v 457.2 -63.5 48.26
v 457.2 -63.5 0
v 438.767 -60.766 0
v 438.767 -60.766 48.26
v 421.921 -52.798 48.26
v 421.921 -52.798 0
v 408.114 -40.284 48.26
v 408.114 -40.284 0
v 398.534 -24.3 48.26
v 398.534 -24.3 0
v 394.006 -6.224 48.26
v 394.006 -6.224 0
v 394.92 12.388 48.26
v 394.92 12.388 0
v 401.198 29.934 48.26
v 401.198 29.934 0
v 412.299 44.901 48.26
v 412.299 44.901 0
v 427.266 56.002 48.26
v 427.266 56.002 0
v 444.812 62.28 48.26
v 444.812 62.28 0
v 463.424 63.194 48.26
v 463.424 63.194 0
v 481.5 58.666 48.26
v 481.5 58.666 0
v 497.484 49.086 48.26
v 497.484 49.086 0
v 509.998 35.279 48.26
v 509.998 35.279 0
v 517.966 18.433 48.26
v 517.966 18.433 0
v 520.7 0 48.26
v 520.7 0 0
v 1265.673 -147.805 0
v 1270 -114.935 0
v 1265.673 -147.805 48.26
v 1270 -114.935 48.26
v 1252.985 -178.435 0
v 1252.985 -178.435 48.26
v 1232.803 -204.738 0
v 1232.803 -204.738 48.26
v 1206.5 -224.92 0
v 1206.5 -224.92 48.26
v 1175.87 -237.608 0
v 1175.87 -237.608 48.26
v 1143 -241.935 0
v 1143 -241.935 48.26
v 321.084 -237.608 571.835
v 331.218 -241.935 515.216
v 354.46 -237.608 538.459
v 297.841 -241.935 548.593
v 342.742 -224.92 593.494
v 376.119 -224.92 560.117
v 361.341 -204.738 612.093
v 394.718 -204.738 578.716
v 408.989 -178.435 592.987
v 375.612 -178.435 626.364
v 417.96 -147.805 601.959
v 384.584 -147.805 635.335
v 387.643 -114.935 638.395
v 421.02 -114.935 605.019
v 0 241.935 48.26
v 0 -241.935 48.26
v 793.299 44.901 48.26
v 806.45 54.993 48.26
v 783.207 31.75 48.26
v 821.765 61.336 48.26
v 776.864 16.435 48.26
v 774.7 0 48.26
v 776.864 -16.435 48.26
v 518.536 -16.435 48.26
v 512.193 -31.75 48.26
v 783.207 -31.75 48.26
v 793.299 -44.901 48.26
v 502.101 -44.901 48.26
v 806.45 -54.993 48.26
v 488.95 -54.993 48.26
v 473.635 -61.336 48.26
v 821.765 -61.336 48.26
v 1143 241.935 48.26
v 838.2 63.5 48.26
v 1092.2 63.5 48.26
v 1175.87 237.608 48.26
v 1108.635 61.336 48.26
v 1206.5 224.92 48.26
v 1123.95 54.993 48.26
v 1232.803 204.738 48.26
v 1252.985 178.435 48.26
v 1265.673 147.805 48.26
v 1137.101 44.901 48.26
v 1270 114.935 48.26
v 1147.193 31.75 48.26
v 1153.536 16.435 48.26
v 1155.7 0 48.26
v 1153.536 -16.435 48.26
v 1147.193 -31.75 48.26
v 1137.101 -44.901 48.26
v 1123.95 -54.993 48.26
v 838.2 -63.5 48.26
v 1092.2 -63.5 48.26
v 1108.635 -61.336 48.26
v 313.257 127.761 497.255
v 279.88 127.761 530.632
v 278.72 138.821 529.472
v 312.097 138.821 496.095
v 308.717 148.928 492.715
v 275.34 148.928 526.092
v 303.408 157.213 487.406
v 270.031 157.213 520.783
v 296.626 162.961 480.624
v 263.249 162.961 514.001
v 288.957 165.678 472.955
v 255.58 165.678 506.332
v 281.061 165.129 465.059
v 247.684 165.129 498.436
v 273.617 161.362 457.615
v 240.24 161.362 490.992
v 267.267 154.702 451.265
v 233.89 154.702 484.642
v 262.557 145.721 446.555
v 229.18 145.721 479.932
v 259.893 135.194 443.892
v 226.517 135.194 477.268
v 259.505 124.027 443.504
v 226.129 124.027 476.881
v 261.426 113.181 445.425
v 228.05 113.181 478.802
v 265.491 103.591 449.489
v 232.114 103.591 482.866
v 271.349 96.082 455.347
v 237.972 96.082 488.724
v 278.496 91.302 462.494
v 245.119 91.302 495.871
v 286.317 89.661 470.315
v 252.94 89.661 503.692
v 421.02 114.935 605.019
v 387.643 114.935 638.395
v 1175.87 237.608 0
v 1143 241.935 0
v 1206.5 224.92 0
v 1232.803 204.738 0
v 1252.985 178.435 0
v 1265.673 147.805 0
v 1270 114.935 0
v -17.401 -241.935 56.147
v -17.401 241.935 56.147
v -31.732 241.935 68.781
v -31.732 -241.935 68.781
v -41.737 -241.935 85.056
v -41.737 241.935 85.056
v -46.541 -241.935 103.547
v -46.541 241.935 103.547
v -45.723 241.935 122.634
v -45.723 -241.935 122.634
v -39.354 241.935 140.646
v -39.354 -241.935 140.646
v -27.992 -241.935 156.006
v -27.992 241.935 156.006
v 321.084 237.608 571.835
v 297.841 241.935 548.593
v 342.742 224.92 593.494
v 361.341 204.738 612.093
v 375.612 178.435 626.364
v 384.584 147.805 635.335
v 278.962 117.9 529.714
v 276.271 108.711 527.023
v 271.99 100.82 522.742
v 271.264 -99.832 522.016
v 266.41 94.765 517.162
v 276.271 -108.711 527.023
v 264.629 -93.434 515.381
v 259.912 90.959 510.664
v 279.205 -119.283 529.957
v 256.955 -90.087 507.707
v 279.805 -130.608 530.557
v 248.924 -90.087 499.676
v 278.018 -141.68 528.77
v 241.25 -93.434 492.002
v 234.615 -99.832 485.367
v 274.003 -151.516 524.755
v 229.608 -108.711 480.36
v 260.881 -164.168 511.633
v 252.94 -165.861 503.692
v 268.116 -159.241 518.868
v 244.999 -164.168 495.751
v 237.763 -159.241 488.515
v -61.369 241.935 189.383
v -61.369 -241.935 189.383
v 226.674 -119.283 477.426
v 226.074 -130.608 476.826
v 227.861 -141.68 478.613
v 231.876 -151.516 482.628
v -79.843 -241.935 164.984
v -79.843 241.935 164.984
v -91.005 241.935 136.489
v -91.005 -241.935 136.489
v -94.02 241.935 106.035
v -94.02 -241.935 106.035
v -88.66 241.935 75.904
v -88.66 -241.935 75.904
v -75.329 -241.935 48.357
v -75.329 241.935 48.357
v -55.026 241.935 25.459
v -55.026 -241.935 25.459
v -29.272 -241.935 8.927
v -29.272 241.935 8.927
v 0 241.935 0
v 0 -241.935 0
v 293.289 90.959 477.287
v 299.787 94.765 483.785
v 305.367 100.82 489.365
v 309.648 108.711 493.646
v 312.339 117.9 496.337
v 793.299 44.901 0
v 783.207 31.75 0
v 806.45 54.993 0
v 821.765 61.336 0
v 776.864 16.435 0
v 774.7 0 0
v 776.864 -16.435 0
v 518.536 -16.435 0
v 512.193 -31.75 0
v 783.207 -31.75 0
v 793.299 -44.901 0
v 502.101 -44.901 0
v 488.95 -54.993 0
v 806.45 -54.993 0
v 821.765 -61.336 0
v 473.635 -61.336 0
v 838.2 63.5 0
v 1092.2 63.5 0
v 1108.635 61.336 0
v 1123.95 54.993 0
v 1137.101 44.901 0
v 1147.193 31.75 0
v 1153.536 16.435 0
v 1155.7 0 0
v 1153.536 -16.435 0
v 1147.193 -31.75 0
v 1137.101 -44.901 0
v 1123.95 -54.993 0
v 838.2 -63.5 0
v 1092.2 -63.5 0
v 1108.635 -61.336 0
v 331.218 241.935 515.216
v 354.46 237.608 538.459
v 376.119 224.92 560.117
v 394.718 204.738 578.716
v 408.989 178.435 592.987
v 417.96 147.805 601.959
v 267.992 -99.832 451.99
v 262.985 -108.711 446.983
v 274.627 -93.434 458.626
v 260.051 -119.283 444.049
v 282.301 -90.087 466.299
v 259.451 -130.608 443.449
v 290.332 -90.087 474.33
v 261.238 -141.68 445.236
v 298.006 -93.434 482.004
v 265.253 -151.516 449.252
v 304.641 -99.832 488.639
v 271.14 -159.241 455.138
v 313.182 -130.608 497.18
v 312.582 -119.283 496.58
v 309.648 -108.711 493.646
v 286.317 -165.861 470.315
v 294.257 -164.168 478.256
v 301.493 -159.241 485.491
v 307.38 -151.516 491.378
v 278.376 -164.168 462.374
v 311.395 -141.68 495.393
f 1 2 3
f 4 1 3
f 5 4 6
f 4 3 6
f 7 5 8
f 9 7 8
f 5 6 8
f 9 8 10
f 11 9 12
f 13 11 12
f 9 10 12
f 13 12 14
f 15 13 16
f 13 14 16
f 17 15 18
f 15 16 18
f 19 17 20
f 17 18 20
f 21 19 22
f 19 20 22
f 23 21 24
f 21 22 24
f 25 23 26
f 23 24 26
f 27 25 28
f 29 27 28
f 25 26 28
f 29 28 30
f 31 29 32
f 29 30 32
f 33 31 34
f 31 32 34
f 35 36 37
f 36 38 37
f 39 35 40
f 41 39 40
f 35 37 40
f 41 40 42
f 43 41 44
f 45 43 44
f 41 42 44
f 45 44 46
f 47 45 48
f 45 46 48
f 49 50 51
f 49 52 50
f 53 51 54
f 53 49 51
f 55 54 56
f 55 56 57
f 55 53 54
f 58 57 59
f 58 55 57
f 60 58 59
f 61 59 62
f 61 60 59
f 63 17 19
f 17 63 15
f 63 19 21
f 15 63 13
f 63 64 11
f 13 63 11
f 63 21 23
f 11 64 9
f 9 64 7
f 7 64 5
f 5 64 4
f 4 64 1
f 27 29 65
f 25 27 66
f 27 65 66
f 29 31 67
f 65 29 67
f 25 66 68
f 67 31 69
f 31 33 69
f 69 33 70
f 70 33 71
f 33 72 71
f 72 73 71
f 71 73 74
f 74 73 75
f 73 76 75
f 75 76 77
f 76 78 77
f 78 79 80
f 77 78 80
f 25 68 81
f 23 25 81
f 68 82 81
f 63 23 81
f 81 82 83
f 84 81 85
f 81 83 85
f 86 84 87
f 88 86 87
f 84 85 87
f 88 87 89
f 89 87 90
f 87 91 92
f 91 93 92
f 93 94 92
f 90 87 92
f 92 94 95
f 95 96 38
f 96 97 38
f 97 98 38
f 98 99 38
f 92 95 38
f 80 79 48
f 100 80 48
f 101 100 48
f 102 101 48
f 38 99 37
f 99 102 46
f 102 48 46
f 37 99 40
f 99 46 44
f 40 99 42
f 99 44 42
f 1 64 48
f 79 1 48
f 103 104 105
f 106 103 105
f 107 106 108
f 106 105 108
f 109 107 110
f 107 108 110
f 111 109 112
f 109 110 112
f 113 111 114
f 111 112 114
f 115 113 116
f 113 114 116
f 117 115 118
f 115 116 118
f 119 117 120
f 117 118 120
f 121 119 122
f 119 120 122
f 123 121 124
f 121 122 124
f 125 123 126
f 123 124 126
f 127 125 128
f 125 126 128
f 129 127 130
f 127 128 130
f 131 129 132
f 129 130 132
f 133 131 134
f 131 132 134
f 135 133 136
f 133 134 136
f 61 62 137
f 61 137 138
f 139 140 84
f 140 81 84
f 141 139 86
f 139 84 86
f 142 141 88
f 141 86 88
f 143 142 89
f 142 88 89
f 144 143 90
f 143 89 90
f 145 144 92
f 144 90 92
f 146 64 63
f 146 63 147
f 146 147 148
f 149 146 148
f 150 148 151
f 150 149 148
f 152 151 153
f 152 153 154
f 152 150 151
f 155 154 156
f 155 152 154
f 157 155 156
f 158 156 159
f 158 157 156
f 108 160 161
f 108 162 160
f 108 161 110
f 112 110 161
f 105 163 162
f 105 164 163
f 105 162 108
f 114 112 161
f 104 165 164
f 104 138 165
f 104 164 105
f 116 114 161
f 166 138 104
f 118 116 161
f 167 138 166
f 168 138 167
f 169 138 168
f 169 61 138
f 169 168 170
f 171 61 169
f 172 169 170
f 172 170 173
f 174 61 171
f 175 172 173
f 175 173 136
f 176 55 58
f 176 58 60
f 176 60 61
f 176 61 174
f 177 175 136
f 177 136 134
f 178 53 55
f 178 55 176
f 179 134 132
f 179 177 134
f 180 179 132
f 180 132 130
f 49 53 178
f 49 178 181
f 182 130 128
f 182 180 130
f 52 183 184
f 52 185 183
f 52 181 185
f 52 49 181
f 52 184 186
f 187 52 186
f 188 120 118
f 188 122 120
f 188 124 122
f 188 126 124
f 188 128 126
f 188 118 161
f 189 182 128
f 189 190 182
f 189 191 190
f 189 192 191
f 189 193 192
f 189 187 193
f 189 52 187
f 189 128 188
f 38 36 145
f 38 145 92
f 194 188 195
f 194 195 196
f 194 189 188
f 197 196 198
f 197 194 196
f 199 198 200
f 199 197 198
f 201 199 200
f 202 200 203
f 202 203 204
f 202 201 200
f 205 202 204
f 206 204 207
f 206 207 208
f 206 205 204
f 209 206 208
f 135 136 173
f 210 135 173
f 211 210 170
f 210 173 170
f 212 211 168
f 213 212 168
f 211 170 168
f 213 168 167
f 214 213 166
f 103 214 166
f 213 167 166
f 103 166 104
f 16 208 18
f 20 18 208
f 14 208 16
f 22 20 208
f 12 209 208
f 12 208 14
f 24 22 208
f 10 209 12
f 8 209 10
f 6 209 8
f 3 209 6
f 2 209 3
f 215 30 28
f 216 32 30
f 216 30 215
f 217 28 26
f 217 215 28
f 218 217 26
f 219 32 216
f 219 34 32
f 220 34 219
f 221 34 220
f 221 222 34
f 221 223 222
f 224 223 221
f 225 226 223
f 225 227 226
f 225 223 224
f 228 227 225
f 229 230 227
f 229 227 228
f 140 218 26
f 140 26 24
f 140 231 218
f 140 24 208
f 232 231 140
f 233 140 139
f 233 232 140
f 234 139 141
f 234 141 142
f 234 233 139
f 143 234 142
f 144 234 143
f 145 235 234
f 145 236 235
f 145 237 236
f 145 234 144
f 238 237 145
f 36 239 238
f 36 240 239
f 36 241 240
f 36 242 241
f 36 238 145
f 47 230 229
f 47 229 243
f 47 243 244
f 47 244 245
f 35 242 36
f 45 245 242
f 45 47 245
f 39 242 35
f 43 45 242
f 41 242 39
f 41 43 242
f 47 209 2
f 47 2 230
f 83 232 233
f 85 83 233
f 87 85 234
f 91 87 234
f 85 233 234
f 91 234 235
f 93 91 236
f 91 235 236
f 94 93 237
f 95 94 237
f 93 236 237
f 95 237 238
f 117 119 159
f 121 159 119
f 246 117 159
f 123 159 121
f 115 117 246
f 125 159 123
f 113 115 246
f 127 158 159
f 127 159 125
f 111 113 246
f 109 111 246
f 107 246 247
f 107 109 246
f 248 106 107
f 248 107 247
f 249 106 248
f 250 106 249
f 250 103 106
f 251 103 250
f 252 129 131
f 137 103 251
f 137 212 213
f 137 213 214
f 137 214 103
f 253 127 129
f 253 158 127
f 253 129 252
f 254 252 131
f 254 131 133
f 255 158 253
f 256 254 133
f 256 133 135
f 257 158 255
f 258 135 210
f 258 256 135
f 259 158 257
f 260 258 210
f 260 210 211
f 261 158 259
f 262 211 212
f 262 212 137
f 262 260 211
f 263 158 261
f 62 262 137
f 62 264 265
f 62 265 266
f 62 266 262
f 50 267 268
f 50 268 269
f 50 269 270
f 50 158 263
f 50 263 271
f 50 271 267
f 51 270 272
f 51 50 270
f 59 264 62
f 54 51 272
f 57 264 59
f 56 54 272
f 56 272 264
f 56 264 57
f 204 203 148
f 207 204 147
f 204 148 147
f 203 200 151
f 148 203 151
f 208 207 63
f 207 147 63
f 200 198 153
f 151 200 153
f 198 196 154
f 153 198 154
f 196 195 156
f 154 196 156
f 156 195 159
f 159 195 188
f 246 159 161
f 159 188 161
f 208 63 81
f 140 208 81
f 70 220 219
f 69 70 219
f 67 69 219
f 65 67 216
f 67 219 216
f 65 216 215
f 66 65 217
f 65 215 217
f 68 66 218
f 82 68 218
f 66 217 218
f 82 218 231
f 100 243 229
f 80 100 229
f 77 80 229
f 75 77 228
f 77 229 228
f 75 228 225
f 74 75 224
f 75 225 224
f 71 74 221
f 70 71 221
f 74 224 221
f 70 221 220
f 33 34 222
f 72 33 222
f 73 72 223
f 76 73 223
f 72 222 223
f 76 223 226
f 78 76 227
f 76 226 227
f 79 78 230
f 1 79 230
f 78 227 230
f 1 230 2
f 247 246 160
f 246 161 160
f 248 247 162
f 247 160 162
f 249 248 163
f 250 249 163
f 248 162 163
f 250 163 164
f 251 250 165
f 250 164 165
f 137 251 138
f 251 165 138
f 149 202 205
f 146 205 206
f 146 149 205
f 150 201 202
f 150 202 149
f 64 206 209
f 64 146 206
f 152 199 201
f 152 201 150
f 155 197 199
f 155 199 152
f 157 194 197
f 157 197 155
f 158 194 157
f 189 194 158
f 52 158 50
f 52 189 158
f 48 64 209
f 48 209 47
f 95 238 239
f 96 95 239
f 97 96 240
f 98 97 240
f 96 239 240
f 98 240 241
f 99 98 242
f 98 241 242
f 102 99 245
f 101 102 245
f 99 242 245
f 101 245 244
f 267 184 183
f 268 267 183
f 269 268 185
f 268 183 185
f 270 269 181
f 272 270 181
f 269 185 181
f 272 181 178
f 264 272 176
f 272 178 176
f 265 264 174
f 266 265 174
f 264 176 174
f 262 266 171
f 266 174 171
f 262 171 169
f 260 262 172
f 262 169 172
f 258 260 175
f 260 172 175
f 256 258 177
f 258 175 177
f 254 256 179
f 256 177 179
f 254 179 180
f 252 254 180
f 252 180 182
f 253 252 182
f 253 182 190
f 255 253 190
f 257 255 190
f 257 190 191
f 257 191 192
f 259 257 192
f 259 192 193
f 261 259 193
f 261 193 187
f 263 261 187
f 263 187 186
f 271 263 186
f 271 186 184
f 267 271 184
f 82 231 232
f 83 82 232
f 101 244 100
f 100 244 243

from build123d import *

# Parameters (mm, degrees)
F0_W     = 1270
F0_H     = 48.26
F1_DEPTH = 241.935
F3_DEPTH = 254
F5_DEPTH = 127
F6_R     = 38.1
F7_DEPTH = 101.6
F8_R     = 127


with BuildPart() as f1:
    # F0 (on Front) → F1 (new body, symmetric)
    with BuildSketch(Plane.XZ):
        with Locations((635, 24.13)):
            Rectangle(F0_W, F0_H)
        with BuildLine():
            ThreePointArc((-61.369352, 189.382638), (-88.660331, 75.904336), (0, 0))
            Line((0, 0), (0, 48.26))
            ThreePointArc((0, 48.26), (-44.826748, 94.123068), (-27.992452, 156.005738))
            Line((-27.992452, 156.005738), (421.020354, 605.018544))
            Line((421.020354, 605.018544), (387.643454, 638.395444))
            Line((387.643454, 638.395444), (-61.369352, 189.382638))
        make_face()
    extrude(amount=F1_DEPTH, both=True)

    # F2 (on face) → F3 (cut)
    with BuildSketch(Plane(origin=(0, 0, 0), x_dir=(1, 0, 0), z_dir=(0, 0, -1))):
        with BuildLine():
            ThreePointArc((1092.2, -63.5), (1137.101281, -44.901281), (1155.7, 0))
            ThreePointArc((1155.7, 0), (1137.101281, 44.901281), (1092.2, 63.5))
            Line((1092.2, 63.5), (838.2, 63.5))
            ThreePointArc((838.2, 63.5), (793.298719, 44.901281), (774.7, 0))
            ThreePointArc((774.7, 0), (793.298719, -44.901281), (838.2, -63.5))
            Line((838.2, -63.5), (1092.2, -63.5))
        make_face()
    extrude(amount=-F3_DEPTH, mode=Mode.SUBTRACT)

    # F4 (on face) → F5 (cut)
    with BuildSketch(Plane(origin=(0, 0, 0), x_dir=(1, 0, 0), z_dir=(0, 0, -1))):
        with BuildLine():
            ThreePointArc((520.7, 0), (502.101281, 44.901281), (457.2, 63.5))
            ThreePointArc((457.2, 63.5), (412.298719, -44.901281), (520.7, 0))
        make_face()
    extrude(amount=-F5_DEPTH, mode=Mode.SUBTRACT)

    # F6 (on face) → F7 (cut)
    with BuildSketch(Plane(origin=(-125.375995, 0, 125.375995), x_dir=(0, -1, 0), z_dir=(-0.707107, 0, 0.707107))):
        with BuildLine():
            ThreePointArc((-127.761006, 573.119062), (-154.701775, 508.078294), (-89.661006, 535.019062))
            ThreePointArc((-89.661006, 535.019062), (-100.820238, 561.959831), (-127.761006, 573.119062))
        make_face()
        with Locations((127.761006, 535.019062)):
            Circle(F6_R)
    extrude(amount=-F7_DEPTH, mode=Mode.SUBTRACT)

    # F8
    f8_edges = [f1.edges().sort_by_distance(p)[0] for p in [
        (404.331904, 241.935, 621.706994),
        (404.331904, -241.935, 621.706994),
        (1270, -241.935, 24.13),
        (1270, 241.935, 24.13),
    ]]
    fillet(f8_edges, radius=F8_R)


solid = f1.part
